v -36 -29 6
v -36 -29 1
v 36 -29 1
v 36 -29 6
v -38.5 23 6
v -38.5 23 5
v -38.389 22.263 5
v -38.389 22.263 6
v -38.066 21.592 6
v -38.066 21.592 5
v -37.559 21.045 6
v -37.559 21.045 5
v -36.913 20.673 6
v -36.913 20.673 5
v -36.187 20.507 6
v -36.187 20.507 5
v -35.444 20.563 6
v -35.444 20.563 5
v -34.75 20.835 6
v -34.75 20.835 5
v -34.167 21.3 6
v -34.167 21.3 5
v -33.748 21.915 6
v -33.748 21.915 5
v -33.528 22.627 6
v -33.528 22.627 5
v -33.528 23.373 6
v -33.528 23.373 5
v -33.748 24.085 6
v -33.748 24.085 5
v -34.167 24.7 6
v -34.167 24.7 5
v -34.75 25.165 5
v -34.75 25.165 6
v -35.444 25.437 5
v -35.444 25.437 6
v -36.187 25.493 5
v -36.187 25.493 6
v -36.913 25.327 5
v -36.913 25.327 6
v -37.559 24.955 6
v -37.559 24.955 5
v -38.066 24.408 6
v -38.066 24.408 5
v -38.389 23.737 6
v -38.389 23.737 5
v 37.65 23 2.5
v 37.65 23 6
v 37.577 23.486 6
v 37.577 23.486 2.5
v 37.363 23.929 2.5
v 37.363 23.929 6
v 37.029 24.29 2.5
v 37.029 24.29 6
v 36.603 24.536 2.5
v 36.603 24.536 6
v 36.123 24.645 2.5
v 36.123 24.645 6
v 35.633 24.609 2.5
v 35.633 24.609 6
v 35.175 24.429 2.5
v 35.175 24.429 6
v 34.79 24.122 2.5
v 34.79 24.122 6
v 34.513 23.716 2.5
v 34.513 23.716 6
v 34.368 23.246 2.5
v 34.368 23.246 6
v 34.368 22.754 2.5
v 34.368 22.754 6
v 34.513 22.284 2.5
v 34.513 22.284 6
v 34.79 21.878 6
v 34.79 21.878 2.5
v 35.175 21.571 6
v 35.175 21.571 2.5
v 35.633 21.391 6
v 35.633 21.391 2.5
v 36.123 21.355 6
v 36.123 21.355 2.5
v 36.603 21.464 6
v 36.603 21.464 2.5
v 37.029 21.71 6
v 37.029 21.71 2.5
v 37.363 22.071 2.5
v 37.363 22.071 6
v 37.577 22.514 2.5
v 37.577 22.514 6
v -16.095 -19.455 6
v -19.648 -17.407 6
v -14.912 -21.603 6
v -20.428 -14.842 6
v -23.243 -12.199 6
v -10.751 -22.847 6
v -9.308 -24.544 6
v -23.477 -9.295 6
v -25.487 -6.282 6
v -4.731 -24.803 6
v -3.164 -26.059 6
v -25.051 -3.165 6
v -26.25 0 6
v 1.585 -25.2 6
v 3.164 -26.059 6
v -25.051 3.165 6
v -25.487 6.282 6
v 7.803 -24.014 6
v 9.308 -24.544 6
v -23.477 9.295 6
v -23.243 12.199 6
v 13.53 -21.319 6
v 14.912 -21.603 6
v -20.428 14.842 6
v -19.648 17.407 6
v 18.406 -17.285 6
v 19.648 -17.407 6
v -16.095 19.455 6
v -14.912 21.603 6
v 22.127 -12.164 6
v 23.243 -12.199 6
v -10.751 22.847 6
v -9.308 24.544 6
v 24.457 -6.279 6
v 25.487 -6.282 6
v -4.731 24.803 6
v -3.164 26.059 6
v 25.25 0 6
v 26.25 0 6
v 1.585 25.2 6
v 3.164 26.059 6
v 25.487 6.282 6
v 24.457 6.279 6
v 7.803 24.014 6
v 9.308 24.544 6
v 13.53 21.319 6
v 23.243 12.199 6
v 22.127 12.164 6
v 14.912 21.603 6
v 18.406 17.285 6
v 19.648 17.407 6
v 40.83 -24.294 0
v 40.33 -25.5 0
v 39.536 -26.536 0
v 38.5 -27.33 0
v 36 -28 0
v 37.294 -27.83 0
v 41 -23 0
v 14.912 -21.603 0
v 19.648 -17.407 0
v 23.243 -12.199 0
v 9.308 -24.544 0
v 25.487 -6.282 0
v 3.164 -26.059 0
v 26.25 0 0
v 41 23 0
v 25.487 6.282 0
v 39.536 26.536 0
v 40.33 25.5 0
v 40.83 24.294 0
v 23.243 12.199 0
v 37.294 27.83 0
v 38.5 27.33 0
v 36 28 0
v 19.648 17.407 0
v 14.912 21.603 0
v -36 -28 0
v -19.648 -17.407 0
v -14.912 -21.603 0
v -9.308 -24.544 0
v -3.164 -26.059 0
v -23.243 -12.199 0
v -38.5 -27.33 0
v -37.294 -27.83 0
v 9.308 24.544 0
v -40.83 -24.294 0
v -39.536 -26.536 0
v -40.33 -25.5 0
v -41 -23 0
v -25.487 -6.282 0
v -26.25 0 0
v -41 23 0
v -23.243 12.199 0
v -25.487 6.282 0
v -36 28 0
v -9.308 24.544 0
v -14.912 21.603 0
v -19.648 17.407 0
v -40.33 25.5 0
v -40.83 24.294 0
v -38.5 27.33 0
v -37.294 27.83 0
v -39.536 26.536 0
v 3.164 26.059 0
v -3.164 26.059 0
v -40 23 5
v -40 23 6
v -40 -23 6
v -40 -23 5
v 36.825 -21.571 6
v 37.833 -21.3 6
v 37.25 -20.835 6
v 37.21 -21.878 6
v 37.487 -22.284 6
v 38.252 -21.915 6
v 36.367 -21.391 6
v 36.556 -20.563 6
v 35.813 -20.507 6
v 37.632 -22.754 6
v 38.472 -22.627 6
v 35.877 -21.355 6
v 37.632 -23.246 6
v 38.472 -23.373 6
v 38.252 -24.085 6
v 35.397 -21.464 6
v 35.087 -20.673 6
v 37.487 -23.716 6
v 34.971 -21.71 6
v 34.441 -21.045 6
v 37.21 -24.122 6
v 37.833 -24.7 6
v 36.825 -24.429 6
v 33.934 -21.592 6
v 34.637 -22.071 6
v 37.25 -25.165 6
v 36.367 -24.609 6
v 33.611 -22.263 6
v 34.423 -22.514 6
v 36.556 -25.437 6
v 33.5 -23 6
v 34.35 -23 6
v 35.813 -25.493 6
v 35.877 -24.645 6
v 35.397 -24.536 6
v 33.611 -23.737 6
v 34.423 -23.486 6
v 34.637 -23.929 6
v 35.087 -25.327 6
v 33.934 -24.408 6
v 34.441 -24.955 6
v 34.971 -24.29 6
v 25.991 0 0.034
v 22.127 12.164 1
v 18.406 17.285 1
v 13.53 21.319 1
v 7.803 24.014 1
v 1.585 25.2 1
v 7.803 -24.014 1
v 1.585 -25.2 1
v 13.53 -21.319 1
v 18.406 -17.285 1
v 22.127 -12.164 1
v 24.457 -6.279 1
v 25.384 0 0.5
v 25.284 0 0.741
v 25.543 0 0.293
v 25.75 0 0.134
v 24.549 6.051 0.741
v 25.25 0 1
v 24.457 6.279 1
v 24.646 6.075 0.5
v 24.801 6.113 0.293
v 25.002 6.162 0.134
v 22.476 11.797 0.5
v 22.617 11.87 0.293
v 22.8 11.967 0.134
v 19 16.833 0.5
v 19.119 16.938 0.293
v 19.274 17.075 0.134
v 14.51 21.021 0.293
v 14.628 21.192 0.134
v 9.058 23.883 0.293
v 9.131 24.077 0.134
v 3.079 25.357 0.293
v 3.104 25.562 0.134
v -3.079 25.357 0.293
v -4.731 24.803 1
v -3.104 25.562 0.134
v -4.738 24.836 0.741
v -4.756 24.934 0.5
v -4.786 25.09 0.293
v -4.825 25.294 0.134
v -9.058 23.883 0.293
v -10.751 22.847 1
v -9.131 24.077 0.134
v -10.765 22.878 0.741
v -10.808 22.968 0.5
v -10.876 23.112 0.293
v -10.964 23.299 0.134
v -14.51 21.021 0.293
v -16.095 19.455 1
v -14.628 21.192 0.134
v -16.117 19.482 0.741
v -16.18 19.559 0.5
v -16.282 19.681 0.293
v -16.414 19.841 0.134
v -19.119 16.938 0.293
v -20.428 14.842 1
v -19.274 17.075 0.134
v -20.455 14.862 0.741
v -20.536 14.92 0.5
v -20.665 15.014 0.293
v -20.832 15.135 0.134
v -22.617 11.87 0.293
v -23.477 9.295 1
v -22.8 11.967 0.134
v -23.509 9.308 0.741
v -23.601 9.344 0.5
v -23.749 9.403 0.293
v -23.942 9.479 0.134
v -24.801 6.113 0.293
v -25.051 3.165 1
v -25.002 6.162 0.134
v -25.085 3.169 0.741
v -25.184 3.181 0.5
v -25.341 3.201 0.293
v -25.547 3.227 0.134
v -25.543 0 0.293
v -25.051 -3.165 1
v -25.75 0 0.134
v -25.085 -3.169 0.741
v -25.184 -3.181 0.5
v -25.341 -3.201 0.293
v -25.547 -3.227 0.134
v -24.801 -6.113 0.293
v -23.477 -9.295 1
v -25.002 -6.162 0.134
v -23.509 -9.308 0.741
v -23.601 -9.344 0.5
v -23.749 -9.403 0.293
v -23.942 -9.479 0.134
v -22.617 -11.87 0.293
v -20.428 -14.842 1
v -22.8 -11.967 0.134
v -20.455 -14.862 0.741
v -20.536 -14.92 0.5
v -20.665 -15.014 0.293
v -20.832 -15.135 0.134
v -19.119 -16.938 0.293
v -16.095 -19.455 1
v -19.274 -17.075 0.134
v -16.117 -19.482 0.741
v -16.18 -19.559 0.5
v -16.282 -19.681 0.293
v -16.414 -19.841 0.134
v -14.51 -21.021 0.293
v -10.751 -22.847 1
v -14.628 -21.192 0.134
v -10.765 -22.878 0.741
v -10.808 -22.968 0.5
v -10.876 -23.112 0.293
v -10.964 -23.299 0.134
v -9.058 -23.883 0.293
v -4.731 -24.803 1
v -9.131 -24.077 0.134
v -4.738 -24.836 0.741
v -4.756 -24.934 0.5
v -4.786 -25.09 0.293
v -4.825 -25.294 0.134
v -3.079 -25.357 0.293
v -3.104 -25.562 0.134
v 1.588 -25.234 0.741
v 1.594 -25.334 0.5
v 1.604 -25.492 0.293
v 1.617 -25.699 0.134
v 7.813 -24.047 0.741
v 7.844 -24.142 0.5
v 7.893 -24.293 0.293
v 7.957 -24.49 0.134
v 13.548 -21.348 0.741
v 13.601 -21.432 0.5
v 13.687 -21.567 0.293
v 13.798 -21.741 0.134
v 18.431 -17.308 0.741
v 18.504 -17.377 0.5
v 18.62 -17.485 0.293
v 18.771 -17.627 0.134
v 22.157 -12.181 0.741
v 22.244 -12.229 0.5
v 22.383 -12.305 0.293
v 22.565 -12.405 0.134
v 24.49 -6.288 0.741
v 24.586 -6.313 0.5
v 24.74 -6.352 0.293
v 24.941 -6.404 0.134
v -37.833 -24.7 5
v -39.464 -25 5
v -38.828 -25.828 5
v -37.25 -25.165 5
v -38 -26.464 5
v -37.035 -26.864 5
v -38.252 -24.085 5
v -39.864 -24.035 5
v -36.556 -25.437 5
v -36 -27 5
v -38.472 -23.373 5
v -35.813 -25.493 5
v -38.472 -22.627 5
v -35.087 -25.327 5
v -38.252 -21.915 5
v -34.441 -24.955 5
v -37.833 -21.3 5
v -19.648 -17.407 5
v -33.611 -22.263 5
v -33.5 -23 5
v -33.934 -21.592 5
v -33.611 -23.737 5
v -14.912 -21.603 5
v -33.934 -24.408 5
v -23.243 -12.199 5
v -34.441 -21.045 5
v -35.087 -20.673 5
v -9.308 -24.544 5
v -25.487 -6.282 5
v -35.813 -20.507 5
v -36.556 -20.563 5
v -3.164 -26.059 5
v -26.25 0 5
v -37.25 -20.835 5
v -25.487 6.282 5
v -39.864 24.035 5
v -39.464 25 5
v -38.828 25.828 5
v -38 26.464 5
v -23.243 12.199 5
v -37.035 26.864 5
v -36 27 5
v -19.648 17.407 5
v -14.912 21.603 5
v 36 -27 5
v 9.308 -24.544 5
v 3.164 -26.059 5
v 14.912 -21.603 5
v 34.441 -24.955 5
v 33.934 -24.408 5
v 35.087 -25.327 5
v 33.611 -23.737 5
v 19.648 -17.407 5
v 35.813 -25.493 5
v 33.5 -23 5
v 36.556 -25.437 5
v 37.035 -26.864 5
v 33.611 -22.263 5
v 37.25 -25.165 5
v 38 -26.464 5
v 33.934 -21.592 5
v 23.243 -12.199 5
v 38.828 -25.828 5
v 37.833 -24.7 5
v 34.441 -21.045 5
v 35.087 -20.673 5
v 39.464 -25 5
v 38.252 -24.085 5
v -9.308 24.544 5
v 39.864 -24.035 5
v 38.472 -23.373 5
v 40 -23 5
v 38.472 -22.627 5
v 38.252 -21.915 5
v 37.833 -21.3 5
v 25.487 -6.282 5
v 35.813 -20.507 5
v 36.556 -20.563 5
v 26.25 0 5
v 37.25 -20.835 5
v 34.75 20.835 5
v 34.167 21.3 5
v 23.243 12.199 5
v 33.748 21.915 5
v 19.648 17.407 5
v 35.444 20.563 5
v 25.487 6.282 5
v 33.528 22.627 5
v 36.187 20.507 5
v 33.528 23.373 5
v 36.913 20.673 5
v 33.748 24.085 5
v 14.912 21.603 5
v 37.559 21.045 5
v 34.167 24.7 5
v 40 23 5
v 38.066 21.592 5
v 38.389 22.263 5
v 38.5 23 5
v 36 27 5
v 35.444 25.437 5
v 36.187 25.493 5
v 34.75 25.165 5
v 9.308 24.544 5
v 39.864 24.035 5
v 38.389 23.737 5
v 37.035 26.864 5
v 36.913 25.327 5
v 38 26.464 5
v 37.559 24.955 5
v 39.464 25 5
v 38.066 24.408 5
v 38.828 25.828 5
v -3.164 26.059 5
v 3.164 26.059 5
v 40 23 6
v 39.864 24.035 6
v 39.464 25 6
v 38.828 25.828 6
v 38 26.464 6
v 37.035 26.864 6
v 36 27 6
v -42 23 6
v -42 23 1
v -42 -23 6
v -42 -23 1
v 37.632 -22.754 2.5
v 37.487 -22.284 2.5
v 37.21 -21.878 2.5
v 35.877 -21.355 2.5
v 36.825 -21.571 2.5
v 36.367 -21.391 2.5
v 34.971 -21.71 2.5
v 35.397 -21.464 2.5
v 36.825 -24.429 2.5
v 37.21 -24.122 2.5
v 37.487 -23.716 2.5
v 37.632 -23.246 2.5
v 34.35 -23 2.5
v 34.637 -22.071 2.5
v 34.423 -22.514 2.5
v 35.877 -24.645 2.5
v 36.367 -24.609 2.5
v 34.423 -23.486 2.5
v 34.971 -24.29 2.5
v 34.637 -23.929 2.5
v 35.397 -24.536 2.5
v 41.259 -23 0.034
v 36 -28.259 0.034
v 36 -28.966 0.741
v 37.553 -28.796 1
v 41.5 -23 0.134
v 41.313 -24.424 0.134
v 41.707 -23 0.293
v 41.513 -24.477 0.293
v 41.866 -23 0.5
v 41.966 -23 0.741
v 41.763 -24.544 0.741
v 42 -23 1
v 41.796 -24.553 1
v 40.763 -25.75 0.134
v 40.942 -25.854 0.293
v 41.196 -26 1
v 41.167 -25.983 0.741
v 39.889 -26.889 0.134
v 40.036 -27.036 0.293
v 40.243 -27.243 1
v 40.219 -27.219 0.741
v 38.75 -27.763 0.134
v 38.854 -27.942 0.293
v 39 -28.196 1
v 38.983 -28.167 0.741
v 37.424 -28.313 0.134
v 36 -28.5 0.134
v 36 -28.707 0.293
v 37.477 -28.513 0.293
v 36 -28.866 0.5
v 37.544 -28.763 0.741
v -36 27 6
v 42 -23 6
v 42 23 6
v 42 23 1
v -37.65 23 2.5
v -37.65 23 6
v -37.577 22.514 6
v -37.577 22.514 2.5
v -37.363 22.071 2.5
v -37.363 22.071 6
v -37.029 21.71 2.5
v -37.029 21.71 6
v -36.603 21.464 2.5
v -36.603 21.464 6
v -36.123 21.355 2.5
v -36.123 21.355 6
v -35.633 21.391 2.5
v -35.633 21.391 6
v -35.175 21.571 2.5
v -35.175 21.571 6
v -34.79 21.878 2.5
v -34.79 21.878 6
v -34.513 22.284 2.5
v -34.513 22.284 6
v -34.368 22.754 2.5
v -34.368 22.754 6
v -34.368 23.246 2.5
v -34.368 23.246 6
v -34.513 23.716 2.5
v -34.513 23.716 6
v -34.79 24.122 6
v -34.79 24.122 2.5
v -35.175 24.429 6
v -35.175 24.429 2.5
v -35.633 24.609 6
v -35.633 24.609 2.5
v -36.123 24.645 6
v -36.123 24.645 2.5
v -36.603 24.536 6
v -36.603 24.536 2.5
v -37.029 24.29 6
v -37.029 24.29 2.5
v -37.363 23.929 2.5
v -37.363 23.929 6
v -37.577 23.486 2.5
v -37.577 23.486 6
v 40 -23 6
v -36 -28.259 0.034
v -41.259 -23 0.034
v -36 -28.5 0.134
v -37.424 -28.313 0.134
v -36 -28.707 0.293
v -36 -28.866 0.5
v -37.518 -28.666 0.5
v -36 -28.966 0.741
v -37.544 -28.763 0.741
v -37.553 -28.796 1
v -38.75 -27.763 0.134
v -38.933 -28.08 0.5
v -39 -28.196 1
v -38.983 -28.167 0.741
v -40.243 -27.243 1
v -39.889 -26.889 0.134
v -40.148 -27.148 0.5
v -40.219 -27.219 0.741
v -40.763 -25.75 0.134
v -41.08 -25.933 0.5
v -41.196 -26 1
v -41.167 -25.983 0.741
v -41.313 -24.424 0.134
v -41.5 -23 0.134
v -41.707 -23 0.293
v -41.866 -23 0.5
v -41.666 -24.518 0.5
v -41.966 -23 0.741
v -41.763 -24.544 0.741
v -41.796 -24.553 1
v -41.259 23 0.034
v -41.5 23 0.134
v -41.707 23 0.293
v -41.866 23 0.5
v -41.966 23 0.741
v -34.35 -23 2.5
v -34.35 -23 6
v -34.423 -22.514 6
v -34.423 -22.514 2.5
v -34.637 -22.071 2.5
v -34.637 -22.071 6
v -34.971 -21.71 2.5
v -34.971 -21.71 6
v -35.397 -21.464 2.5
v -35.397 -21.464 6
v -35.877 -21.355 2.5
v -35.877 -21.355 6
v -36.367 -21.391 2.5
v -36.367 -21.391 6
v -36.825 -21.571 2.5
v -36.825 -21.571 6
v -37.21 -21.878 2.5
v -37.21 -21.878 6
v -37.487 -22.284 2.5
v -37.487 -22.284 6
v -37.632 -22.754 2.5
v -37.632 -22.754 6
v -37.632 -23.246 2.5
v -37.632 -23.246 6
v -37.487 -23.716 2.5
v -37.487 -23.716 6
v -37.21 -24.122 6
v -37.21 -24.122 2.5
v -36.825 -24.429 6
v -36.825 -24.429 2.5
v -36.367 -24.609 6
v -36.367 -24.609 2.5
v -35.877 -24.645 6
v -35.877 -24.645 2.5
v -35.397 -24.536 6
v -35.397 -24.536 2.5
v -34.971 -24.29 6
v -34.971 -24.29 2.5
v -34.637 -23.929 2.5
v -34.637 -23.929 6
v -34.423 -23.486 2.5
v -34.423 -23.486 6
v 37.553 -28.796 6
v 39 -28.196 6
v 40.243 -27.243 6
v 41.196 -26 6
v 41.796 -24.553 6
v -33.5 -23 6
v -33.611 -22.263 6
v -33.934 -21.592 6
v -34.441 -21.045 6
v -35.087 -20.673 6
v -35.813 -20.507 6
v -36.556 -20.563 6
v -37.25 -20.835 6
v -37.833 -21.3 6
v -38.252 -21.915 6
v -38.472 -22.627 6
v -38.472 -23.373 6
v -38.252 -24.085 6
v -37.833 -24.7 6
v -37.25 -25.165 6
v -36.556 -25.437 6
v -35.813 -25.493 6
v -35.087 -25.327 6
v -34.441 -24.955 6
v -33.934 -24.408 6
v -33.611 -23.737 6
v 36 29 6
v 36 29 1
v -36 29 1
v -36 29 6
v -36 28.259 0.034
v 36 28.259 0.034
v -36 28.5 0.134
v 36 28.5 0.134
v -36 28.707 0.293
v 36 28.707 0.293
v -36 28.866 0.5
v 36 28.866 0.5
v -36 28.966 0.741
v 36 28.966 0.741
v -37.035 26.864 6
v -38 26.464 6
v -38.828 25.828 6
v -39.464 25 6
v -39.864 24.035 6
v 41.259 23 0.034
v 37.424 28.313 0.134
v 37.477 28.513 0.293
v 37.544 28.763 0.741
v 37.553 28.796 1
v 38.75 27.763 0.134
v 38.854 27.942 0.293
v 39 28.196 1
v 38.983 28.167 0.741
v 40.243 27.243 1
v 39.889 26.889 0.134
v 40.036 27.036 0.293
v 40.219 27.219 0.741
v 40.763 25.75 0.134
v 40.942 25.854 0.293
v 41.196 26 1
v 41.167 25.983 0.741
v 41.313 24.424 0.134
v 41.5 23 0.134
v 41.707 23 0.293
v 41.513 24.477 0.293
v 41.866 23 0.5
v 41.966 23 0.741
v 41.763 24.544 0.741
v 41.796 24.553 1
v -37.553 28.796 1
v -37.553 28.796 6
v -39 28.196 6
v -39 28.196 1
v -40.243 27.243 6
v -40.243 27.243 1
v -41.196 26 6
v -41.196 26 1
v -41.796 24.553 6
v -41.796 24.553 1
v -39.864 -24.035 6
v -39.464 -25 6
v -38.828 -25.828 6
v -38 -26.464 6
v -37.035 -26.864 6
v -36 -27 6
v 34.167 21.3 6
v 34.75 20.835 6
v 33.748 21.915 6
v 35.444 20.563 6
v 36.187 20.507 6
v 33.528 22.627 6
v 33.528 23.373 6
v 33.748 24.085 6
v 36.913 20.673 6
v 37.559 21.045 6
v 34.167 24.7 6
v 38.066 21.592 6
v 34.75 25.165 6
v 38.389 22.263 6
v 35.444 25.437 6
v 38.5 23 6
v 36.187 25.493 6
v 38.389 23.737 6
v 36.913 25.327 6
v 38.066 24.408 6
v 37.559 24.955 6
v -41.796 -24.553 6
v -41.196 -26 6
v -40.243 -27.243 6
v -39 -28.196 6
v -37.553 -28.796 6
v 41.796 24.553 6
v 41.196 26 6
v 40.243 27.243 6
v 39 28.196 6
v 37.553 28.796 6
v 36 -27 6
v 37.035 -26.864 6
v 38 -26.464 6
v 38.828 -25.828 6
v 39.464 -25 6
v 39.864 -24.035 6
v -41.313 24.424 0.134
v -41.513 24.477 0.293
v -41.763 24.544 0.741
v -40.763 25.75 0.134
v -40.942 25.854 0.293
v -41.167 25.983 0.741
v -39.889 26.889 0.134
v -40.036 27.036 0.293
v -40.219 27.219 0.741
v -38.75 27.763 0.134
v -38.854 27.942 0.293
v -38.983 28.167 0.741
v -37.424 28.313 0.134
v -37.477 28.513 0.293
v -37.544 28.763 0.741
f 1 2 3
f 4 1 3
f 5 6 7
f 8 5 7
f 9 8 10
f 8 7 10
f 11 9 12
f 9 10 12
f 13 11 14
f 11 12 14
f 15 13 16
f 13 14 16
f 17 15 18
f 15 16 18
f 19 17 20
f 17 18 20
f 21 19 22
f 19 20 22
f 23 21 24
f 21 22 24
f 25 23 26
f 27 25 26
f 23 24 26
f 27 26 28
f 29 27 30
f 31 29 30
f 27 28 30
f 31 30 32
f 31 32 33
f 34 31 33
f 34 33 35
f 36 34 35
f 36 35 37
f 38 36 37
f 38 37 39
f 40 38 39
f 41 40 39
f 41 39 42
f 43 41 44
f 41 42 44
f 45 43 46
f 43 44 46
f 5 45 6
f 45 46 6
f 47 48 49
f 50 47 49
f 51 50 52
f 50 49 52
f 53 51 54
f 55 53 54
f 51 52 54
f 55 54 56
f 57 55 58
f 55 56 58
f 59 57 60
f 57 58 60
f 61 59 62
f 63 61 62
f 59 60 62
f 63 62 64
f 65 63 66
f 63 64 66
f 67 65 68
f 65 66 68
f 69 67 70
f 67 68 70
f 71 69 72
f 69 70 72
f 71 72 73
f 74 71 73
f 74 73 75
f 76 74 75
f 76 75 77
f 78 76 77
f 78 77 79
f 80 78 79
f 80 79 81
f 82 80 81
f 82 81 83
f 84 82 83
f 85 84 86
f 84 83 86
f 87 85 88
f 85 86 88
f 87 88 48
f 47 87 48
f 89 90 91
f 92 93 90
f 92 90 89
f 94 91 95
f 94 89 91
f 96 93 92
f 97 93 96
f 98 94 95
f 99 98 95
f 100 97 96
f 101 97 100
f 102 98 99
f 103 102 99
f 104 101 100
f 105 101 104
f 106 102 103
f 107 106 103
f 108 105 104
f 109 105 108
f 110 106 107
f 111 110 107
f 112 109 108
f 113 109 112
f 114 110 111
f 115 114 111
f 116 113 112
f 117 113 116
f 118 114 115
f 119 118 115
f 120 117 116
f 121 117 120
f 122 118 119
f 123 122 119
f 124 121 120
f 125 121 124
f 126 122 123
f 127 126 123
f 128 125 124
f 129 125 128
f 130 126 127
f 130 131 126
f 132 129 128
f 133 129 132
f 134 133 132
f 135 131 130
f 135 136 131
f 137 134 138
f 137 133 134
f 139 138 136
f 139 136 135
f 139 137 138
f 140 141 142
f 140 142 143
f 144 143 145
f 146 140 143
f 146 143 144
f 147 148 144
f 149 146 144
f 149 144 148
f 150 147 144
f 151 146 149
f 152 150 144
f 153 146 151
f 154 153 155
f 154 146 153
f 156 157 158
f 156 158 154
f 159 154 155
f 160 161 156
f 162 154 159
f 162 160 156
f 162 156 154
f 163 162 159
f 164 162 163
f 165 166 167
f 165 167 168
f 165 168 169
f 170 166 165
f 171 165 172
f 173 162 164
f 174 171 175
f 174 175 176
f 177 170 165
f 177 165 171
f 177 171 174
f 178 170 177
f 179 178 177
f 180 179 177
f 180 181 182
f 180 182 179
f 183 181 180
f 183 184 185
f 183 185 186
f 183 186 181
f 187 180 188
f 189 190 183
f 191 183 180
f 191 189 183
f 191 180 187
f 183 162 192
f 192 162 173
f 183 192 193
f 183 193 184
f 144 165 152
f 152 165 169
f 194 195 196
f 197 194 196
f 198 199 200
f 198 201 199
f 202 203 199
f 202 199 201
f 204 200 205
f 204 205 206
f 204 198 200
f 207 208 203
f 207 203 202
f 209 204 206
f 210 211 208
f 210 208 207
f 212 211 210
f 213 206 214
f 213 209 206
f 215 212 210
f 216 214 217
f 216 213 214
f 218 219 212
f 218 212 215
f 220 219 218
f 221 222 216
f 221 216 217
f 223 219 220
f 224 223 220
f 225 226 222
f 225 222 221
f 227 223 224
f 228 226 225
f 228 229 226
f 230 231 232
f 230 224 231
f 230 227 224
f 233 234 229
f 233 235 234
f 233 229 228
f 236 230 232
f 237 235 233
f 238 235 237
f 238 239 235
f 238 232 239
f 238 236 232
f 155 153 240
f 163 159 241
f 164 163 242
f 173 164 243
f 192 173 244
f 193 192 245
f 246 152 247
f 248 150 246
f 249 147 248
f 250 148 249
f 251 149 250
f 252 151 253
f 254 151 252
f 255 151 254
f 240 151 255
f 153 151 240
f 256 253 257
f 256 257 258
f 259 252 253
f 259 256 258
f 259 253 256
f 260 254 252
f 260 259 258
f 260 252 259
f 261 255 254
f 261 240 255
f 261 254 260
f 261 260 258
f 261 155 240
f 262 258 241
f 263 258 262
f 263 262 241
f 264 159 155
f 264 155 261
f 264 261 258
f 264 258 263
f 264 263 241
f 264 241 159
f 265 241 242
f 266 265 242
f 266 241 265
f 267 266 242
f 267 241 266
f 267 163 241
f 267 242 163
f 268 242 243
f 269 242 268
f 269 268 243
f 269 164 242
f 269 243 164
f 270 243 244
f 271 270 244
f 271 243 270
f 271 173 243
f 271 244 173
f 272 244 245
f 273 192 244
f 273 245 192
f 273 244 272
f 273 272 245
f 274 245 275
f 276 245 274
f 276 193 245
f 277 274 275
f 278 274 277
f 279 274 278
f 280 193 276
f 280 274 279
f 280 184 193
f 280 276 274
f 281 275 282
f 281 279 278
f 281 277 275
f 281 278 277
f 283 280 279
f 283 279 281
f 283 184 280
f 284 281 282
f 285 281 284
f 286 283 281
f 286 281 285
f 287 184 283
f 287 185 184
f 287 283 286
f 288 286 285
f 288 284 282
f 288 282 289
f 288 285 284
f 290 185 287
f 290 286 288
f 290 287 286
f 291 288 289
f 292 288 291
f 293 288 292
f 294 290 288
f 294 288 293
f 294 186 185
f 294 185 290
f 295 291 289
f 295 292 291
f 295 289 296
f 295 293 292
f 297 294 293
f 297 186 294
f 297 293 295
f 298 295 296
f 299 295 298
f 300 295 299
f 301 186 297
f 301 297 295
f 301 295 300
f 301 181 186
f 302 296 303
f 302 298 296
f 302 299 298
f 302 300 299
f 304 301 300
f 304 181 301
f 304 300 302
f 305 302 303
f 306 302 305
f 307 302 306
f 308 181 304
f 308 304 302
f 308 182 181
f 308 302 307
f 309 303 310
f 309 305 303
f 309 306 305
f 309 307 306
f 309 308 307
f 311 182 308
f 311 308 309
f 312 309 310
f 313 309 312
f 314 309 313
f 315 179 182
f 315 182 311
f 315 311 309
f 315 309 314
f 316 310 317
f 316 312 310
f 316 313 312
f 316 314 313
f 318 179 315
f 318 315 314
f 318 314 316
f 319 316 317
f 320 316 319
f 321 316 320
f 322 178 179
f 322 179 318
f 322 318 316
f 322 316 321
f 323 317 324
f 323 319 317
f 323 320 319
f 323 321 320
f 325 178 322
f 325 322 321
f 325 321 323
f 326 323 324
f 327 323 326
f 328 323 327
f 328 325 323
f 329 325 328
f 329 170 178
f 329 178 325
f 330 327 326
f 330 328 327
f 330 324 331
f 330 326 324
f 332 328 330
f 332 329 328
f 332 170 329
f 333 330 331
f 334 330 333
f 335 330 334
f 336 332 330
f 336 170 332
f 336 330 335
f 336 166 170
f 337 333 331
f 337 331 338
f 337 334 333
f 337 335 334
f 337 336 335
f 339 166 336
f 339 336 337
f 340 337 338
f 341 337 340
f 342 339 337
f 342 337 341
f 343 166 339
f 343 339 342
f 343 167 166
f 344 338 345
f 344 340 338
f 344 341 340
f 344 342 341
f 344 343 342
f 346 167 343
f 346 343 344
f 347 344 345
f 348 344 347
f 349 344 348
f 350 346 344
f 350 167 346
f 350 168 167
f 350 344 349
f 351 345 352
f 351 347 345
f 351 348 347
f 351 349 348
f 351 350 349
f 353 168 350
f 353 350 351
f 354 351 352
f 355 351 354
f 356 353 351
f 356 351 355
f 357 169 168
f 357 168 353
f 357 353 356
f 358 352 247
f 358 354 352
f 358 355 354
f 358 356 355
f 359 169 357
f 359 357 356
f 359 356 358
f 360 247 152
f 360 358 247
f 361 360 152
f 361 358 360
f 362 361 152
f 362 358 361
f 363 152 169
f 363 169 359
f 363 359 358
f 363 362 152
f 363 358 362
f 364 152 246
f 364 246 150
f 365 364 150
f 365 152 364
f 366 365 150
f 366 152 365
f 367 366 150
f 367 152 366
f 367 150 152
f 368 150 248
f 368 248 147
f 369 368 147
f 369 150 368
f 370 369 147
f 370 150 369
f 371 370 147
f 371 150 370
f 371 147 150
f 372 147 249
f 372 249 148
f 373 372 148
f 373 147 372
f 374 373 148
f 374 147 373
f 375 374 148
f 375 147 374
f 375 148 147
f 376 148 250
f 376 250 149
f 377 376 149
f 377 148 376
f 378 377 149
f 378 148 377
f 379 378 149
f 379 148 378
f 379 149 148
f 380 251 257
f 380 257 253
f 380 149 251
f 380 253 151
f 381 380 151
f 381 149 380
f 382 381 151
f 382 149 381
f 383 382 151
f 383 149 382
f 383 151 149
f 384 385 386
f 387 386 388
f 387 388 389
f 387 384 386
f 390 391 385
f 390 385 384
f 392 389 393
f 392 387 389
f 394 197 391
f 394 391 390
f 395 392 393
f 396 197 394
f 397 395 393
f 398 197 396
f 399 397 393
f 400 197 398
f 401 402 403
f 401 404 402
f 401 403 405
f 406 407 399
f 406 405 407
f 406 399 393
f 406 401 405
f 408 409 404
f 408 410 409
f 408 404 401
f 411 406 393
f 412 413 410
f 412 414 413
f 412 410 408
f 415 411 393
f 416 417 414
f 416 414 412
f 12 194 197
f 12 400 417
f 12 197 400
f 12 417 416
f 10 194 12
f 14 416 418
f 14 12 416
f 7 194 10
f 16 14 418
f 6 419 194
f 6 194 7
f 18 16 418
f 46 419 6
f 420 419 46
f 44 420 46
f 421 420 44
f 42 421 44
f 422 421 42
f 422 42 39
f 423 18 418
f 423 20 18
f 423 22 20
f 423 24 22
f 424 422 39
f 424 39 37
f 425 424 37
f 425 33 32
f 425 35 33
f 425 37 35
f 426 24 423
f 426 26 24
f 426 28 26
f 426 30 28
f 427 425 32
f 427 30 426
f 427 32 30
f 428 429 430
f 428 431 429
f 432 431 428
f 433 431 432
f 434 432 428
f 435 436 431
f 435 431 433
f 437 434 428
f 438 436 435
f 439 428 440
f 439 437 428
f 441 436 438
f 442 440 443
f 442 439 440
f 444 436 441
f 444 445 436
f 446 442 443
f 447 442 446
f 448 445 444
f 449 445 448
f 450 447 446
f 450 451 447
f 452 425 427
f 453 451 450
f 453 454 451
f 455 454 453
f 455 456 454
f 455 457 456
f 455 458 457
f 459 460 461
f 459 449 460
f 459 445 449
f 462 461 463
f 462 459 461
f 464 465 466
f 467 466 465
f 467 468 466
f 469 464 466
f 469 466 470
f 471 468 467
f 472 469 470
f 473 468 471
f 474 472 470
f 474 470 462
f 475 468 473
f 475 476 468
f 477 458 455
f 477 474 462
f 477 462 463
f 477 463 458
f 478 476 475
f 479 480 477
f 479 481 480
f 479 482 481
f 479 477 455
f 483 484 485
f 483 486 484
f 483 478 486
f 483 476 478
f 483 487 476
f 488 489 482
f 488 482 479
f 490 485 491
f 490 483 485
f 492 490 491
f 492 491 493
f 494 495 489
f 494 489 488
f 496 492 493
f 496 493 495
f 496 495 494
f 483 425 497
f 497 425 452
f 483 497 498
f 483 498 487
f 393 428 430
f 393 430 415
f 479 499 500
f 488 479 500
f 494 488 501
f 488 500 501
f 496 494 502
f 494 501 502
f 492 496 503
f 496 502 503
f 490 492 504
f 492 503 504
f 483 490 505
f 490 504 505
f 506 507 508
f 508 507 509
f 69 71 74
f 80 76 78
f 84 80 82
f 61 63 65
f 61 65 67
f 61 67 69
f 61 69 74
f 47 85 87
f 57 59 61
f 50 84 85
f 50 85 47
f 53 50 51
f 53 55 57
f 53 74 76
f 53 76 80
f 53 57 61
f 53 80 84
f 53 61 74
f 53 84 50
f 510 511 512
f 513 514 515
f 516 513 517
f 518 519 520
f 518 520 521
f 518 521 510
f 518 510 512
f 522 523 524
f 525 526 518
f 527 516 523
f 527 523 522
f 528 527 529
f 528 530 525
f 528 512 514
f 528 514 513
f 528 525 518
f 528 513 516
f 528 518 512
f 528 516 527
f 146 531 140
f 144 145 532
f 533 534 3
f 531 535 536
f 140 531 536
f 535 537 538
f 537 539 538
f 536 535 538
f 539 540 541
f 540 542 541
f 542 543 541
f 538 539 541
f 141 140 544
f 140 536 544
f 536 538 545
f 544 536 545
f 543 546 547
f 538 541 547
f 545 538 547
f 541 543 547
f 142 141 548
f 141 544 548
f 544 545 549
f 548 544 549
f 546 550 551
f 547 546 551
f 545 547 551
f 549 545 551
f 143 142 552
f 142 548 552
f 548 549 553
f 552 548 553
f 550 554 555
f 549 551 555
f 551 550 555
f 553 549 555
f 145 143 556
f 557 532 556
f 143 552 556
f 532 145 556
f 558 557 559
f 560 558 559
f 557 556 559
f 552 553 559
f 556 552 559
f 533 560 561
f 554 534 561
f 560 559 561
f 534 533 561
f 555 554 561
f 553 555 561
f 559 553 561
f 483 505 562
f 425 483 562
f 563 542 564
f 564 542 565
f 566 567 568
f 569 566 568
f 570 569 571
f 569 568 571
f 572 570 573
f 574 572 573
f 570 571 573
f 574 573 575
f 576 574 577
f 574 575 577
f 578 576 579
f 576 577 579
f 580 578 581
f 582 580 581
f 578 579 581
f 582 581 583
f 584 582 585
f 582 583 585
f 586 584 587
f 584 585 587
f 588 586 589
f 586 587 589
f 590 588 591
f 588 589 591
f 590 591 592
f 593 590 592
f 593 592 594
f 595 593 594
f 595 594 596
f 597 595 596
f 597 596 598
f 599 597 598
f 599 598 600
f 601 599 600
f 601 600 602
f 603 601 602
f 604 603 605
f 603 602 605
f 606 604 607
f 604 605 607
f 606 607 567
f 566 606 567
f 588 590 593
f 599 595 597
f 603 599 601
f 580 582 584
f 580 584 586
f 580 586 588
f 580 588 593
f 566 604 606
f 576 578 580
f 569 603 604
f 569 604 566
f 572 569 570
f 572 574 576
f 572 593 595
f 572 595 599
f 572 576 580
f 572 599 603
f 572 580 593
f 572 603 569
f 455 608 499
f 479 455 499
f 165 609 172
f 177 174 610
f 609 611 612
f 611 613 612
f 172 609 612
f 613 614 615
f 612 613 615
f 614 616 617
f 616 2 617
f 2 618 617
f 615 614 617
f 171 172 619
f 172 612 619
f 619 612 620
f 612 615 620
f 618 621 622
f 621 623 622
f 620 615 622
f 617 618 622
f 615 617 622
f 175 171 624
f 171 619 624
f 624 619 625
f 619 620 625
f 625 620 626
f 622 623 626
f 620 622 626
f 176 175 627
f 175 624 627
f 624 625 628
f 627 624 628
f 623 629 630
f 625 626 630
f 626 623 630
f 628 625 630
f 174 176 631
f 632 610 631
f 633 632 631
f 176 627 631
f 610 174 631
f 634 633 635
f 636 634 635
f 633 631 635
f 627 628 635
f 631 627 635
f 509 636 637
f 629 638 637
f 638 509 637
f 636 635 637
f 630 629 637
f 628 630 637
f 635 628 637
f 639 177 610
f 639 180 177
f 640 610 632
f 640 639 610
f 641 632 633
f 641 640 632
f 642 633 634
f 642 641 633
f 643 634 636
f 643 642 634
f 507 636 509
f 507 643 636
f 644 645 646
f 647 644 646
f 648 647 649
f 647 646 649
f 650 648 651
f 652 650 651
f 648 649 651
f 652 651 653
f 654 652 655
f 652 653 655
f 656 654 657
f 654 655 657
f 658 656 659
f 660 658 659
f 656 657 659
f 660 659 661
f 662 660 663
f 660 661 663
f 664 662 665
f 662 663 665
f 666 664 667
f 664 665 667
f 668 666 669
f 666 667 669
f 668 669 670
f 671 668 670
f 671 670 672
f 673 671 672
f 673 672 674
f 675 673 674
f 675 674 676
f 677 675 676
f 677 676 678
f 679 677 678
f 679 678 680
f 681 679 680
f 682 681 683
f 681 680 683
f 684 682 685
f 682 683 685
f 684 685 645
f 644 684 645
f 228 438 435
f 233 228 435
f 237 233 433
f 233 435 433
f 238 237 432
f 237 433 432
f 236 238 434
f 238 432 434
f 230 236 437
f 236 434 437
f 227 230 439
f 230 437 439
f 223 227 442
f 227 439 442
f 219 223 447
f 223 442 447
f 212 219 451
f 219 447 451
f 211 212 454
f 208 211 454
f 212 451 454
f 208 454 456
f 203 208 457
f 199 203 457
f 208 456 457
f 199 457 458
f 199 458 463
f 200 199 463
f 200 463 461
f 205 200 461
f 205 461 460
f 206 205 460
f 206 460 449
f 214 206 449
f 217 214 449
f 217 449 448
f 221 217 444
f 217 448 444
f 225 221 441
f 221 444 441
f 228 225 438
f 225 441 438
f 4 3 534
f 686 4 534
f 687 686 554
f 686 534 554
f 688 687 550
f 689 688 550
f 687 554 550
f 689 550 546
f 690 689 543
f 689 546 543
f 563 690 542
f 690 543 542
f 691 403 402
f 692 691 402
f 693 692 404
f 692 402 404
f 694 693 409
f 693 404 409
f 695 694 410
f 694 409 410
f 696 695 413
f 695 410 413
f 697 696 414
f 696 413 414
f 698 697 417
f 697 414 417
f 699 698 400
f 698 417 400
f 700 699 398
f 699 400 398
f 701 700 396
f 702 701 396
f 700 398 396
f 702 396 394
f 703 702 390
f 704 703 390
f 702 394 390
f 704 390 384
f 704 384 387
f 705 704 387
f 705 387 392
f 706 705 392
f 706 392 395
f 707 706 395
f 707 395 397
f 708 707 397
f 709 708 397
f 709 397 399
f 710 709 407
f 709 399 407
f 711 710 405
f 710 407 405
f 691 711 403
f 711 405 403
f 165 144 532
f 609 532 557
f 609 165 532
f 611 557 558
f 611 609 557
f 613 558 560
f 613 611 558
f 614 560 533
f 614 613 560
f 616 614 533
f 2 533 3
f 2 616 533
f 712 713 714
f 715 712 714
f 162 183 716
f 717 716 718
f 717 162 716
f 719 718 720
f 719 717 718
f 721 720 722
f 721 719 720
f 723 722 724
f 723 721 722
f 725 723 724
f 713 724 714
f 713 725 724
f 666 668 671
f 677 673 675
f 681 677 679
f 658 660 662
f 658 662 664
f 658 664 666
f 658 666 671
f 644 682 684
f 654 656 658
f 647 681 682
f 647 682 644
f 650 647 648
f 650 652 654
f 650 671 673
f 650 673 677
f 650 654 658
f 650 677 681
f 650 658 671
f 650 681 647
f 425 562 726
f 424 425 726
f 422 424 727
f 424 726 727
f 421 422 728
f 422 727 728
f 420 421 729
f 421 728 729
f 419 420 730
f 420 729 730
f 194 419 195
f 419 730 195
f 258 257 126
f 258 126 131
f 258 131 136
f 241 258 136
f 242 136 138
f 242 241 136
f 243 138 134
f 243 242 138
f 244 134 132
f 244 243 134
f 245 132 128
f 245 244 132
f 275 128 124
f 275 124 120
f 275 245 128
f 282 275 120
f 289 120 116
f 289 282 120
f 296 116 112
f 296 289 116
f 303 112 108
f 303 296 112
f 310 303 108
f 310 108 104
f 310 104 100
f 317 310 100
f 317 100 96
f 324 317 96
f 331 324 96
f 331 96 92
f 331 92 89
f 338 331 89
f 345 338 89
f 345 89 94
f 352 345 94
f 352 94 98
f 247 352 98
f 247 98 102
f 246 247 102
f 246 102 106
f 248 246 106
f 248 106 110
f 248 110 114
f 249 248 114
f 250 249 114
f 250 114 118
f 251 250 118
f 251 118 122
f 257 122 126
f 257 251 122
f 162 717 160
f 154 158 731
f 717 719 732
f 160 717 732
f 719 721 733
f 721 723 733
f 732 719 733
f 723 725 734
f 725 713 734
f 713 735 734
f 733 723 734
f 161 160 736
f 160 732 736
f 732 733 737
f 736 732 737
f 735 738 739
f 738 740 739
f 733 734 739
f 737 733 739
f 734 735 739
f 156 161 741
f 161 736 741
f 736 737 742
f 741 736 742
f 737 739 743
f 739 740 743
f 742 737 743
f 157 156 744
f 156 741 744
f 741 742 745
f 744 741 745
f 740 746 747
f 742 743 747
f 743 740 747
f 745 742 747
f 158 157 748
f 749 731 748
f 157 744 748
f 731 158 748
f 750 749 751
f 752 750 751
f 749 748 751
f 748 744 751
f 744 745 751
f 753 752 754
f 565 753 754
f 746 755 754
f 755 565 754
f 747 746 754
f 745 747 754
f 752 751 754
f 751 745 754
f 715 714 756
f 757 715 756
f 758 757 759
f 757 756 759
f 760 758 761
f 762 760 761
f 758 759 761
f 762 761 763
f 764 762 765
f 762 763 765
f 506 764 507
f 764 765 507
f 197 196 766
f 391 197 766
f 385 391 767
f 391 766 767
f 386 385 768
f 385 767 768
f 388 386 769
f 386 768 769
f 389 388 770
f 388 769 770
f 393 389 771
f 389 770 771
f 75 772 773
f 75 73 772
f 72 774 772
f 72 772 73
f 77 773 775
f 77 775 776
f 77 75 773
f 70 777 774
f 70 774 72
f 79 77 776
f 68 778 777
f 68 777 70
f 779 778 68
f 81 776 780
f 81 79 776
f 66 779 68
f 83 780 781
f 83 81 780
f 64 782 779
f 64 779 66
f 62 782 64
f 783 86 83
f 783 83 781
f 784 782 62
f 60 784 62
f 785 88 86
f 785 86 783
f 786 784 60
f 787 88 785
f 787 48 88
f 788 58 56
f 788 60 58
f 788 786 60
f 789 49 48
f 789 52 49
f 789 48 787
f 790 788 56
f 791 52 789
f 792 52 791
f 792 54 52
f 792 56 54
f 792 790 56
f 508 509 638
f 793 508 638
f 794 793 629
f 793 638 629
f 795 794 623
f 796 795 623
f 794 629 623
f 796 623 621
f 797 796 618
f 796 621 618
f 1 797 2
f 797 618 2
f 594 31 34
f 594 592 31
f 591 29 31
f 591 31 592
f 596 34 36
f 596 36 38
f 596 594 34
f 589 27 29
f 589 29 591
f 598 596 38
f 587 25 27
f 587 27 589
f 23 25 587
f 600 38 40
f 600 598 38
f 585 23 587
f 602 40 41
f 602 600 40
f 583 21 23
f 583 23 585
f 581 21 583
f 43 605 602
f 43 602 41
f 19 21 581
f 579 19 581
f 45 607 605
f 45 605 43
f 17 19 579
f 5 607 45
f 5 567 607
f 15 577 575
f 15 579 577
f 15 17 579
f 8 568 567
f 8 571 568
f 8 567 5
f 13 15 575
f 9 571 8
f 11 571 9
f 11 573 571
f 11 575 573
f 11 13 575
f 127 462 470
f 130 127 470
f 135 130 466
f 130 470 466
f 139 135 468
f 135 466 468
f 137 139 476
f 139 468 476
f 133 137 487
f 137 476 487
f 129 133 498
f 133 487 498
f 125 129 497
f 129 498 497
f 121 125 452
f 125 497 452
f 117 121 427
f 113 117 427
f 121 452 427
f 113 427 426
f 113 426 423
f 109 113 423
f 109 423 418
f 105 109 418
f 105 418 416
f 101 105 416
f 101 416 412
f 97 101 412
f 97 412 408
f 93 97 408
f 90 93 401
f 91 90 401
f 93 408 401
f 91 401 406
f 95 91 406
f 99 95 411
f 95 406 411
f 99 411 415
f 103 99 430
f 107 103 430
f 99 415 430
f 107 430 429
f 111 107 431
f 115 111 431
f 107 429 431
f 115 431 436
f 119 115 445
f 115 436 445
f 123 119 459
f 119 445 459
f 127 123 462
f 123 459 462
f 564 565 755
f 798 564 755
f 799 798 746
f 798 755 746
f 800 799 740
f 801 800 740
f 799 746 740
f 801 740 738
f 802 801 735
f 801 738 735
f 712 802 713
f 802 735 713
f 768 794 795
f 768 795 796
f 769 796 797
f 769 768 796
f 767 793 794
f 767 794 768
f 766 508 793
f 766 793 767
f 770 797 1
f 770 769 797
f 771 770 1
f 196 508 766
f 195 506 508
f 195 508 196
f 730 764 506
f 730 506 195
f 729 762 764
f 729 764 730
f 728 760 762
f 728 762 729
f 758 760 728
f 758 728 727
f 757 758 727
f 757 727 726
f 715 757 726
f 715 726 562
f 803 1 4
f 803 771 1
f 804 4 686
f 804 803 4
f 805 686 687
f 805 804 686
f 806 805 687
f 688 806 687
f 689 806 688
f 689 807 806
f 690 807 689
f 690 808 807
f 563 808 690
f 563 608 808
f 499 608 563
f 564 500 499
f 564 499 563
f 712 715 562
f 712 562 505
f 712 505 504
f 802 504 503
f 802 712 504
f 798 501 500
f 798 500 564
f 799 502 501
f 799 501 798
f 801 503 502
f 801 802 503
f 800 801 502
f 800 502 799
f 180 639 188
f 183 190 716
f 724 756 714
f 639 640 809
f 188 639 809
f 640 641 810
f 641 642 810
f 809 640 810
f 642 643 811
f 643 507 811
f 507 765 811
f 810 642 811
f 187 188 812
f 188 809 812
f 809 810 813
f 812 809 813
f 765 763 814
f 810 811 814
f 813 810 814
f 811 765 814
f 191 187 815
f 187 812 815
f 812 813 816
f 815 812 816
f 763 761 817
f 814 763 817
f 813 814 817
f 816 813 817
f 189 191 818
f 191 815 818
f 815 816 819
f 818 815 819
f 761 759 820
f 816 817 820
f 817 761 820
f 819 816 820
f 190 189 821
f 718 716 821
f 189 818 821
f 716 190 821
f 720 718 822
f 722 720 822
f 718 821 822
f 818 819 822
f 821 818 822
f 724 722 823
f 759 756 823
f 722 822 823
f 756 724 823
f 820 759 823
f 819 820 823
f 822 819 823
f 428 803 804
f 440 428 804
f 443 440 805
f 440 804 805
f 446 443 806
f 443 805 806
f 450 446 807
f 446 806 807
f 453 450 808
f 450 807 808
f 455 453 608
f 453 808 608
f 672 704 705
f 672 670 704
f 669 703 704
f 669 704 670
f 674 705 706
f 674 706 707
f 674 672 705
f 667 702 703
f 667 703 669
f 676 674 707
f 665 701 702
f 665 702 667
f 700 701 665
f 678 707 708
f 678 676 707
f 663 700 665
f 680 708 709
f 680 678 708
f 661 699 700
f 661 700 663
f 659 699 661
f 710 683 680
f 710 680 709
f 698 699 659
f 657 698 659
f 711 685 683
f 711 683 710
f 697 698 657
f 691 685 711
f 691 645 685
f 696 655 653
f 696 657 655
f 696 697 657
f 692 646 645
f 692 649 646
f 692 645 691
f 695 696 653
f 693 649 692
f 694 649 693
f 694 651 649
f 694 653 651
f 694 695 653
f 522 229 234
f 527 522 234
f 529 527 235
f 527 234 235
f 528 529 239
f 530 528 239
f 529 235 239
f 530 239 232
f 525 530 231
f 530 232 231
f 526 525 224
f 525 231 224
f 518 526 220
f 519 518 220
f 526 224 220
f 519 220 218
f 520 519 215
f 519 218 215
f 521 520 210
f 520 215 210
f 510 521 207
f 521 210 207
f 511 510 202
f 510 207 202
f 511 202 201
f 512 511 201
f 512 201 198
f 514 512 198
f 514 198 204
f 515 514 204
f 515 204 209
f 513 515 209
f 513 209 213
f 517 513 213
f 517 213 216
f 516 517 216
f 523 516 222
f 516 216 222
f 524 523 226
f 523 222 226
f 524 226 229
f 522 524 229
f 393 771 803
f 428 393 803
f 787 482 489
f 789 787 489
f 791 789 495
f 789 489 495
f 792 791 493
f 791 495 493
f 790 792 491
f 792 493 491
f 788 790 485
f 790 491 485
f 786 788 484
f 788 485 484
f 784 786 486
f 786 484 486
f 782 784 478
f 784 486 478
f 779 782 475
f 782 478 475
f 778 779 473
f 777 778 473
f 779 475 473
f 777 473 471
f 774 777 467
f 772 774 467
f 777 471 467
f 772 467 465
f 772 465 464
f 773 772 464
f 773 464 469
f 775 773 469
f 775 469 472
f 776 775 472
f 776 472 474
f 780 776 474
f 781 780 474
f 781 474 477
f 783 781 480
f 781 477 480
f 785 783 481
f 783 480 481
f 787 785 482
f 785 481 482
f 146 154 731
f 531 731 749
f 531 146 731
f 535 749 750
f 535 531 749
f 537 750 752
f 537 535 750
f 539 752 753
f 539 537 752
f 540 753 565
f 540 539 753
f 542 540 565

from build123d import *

# Parameters (mm, degrees)
SKETCH_1_R          = 25.25
EXTRUDE_1_DEPTH     = 5
SKETCH_2_R          = 23.85
EXTRUDE_2_DEPTH     = 1
CHAMFER_2_SIZE      = 0.5
CUT_EXTRUDE_1_DEPTH = 1
SKETCH_4_R          = 26.25
SKETCH_4_R_2        = 25.25
EXTRUDE_3_DEPTH     = 1
SKETCH_5_R          = 2.5
EXTRUDE_4_DEPTH     = 1
SKETCH_6_R          = 1.65
CUT_EXTRUDE_2_DEPTH = 3.5
FILLET_2_R          = 1


with BuildPart() as part:
    # 草图1 → 凸台-拉伸1 (new body)
    with BuildSketch(Plane.XY):
        with BuildLine():
            Line((-36, 29), (36, 29))
            ThreePointArc((36, 29), (40.242640687, 27.242640687), (42, 23))
            Line((42, 23), (42, -23))
            ThreePointArc((42, -23), (40.242640687, -27.242640687), (36, -29))
            Line((36, -29), (-36, -29))
            ThreePointArc((-36, -29), (-40.242640687, -27.242640687), (-42, -23))
            Line((-42, -23), (-42, 23))
            ThreePointArc((-42, 23), (-40.242640687, 27.242640687), (-36, 29))
        make_face()
        Circle(SKETCH_1_R, mode=Mode.SUBTRACT)
    extrude(amount=EXTRUDE_1_DEPTH)

    # 草图2 → 凸台-拉伸2 (add)
    with BuildSketch(Plane.XY.offset(5)):
        with BuildLine():
            Line((36, 29), (-36, 29))
            ThreePointArc((-36, 29), (-40.242640687, 27.242640687), (-42, 23))
            Line((-42, 23), (-42, -23))
            ThreePointArc((-42, -23), (-40.242640687, -27.242640687), (-36, -29))
            Line((-36, -29), (36, -29))
            ThreePointArc((36, -29), (40.242640687, -27.242640687), (42, -23))
            Line((42, -23), (42, 23))
            ThreePointArc((42, 23), (40.242640687, 27.242640687), (36, 29))
        make_face()
        Circle(SKETCH_2_R, mode=Mode.SUBTRACT)
    extrude(amount=EXTRUDE_2_DEPTH)

    # 倒角2
    chamfer_2_edges = [part.edges().sort_by_distance(p)[0] for p in [
        (-23.85, 0, 5),
    ]]
    chamfer(chamfer_2_edges, length=CHAMFER_2_SIZE)

    # 草图3 → 切除-拉伸1 (cut)
    with BuildSketch(Plane.XY.offset(6)):
        with BuildLine():
            Line((36, 27), (-36, 27))
            ThreePointArc((-36, 27), (-38.828427125, 25.828427125), (-40, 23))
            Line((-40, 23), (-40, -23))
            ThreePointArc((-40, -23), (-38.828427125, -25.828427125), (-36, -27))
            Line((-36, -27), (36, -27))
            ThreePointArc((36, -27), (38.828427125, -25.828427125), (40, -23))
            Line((40, -23), (40, 23))
            ThreePointArc((40, 23), (38.828427125, 25.828427125), (36, 27))
        make_face()
    extrude(amount=-CUT_EXTRUDE_1_DEPTH, mode=Mode.SUBTRACT)

    # 草图4 → 凸台-拉伸3 (add)
    with BuildSketch(Plane.XY.offset(5)):
        Circle(SKETCH_4_R)
        Circle(SKETCH_4_R_2, mode=Mode.SUBTRACT)
    extrude(amount=EXTRUDE_3_DEPTH)

    # 草图5 → 凸台-拉伸4 (add)
    with BuildSketch(Plane.XY.offset(5)):
        with Locations((36, 23)):
            Circle(SKETCH_5_R)
        with Locations(Location((36, -23, 0), (0, 0, 180))):
            Circle(SKETCH_5_R)
        with Locations(Location((-36, 23, 0), (0, 0, 180))):
            Circle(SKETCH_5_R)
        with Locations((-36, -23)):
            Circle(SKETCH_5_R)
    extrude(amount=EXTRUDE_4_DEPTH)

    # 草图6 → 切除-拉伸2 (cut)
    with BuildSketch(Plane.XY.offset(6)):
        with Locations((36, 23)):
            Circle(SKETCH_6_R)
        with Locations(Location((36, -23, 0), (0, 0, 180))):
            Circle(SKETCH_6_R)
        with Locations(Location((-36, 23, 0), (0, 0, 180))):
            Circle(SKETCH_6_R)
        with Locations((-36, -23)):
            Circle(SKETCH_6_R)
    extrude(amount=-CUT_EXTRUDE_2_DEPTH, mode=Mode.SUBTRACT)

    # 圆角2
    fillet_2_edges = [part.edges().sort_by_distance(p)[0] for p in [
        (-42, 0, 0),
        (-40.242640687, 27.242640687, 0),
        (0, 29, 0),
        (40.242640687, 27.242640687, 0),
        (-25.25, 0, 0),
        (42, 0, 0),
        (40.242640687, -27.242640687, 0),
        (0, -29, 0),
        (-40.242640687, -27.242640687, 0),
    ]]
    fillet(fillet_2_edges, radius=FILLET_2_R)


solid = part.part
